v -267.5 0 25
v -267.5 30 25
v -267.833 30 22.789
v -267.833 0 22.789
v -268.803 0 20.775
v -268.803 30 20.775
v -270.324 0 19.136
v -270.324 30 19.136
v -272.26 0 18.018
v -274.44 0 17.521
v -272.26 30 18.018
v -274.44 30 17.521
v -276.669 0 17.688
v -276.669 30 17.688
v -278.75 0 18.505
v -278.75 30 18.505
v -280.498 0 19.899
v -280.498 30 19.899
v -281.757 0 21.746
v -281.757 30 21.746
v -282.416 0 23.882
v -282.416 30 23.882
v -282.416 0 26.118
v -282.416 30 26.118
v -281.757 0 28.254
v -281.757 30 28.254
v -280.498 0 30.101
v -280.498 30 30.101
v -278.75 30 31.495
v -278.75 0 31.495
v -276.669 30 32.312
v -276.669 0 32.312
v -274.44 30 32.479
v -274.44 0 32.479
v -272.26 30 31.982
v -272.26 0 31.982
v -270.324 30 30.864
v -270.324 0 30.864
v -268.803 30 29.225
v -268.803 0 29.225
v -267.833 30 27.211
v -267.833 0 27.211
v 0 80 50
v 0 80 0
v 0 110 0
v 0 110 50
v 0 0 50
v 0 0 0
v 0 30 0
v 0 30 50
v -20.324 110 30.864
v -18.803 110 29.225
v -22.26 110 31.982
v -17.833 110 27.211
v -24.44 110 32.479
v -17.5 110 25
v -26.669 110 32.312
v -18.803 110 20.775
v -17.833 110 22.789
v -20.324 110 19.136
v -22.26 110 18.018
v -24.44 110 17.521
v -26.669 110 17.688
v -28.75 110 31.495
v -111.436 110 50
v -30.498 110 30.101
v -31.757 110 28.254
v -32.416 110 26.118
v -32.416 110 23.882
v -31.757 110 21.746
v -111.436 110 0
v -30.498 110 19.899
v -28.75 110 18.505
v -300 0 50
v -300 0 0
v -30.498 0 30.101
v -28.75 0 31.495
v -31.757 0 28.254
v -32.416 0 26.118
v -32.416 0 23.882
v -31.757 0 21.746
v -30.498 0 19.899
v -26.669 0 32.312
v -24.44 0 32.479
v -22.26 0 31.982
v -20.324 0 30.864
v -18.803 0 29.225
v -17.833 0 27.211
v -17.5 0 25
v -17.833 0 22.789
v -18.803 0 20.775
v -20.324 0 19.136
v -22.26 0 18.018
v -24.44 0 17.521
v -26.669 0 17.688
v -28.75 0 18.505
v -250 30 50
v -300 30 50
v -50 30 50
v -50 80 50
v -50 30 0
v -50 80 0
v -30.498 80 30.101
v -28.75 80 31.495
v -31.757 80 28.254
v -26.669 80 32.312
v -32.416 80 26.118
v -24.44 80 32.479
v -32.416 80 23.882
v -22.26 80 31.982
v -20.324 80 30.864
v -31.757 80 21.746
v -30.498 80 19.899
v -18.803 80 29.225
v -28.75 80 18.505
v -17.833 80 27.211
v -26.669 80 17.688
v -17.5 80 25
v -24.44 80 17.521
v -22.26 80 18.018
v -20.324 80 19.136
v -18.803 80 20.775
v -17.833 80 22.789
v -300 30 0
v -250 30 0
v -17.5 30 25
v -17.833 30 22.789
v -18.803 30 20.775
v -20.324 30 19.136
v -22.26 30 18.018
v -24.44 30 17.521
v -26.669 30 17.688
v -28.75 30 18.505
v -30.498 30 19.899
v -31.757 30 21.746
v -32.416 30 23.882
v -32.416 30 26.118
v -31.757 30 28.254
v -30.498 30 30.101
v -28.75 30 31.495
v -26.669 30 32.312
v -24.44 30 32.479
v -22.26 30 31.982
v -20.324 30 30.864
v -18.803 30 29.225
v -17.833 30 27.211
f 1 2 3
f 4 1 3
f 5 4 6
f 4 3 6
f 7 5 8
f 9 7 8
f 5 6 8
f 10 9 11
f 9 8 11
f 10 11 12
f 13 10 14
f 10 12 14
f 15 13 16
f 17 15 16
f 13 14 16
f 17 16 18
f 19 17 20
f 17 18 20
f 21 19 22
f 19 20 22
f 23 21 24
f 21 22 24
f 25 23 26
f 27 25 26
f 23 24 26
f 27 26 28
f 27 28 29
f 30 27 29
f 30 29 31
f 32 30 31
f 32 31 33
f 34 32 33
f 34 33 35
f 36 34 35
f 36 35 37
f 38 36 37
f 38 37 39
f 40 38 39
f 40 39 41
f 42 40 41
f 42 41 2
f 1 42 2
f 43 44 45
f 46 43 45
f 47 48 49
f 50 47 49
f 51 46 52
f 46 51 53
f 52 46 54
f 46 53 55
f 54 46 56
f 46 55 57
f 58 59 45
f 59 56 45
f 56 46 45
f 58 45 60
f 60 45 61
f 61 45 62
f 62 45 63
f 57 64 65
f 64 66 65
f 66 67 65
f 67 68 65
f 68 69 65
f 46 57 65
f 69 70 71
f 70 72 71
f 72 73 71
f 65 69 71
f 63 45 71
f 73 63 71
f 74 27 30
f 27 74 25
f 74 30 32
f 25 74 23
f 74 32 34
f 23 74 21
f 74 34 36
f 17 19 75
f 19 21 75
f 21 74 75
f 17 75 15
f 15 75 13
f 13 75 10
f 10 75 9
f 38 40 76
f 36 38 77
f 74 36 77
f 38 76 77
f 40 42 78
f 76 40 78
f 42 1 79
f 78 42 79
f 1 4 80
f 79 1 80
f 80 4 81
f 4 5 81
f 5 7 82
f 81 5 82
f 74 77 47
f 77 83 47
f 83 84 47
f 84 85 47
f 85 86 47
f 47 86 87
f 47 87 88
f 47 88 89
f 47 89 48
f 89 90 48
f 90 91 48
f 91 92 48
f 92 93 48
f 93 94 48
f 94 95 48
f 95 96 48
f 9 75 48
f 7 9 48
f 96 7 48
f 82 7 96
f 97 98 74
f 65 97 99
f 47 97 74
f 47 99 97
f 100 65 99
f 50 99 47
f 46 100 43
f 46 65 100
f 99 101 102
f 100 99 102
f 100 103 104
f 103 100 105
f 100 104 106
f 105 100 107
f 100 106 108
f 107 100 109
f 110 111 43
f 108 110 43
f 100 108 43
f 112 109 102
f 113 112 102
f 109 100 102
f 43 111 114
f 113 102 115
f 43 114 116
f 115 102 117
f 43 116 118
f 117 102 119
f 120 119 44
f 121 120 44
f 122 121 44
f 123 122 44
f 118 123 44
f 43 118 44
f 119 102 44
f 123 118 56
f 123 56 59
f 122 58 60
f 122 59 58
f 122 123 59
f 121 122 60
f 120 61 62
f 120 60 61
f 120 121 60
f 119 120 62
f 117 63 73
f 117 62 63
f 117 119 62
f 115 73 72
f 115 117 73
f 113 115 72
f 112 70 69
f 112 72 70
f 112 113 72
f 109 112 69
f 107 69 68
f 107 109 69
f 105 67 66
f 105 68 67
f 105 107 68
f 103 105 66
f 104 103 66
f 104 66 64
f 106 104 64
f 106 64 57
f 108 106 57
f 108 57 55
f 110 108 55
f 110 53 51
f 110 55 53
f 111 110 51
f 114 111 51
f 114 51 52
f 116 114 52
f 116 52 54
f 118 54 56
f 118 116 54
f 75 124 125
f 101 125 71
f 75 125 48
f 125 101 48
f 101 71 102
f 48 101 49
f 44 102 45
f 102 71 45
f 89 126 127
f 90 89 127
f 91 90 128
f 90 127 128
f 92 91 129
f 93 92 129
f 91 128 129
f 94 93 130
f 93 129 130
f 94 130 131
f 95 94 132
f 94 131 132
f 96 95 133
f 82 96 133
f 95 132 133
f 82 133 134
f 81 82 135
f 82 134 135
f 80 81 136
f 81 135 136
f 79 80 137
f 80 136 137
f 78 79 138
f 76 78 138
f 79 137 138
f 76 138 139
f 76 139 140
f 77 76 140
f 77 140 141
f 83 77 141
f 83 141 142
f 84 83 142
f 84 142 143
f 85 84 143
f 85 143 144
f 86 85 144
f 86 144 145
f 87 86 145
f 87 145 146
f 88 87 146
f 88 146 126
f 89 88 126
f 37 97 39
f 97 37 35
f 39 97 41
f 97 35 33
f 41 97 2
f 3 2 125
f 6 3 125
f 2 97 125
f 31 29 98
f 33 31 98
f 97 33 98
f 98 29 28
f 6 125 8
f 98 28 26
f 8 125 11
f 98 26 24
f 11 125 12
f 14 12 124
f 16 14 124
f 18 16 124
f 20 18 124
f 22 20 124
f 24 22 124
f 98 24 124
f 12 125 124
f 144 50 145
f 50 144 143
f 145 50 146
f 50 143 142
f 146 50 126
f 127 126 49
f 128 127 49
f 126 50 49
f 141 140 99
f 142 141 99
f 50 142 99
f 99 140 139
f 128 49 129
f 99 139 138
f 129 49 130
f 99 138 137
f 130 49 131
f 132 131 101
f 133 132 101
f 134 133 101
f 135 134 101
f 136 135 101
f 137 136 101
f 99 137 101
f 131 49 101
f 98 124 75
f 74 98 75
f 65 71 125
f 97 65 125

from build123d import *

# Parameters (mm, degrees)
BOSS_EXTRUDE1_DEPTH     = 50
SKETCH2_R               = 7.5
CUT_EXTRUDE1_DEPTH      = 81
CUT_EXTRUDE1_DEPTH_BACK = 31


with BuildPart() as part:
    # Sketch1 → Boss-Extrude1 (new body)
    with BuildSketch(Plane.XY):
        Polygon((-300, 0), (0, 0), (0, 30), (-50, 30), (-50, 80), (0, 80), (0, 110), (-111.435935394, 110), (-250, 30), (-300, 30), align=None)
    extrude(amount=BOSS_EXTRUDE1_DEPTH)

    # Sketch2 → Cut-Extrude1 (cut, two sides)
    with BuildSketch(Plane(origin=(0, 30, 0), x_dir=(1, 0, 0), z_dir=(0, 1, 0))) as cut_extrude1_sk:
        with Locations((-275, -25)):
            Circle(SKETCH2_R)
        with Locations((-25, -25)):
            Circle(SKETCH2_R)
    extrude(amount=CUT_EXTRUDE1_DEPTH, mode=Mode.SUBTRACT)
    extrude(cut_extrude1_sk.sketch, amount=-CUT_EXTRUDE1_DEPTH_BACK, mode=Mode.SUBTRACT)


solid = part.part
